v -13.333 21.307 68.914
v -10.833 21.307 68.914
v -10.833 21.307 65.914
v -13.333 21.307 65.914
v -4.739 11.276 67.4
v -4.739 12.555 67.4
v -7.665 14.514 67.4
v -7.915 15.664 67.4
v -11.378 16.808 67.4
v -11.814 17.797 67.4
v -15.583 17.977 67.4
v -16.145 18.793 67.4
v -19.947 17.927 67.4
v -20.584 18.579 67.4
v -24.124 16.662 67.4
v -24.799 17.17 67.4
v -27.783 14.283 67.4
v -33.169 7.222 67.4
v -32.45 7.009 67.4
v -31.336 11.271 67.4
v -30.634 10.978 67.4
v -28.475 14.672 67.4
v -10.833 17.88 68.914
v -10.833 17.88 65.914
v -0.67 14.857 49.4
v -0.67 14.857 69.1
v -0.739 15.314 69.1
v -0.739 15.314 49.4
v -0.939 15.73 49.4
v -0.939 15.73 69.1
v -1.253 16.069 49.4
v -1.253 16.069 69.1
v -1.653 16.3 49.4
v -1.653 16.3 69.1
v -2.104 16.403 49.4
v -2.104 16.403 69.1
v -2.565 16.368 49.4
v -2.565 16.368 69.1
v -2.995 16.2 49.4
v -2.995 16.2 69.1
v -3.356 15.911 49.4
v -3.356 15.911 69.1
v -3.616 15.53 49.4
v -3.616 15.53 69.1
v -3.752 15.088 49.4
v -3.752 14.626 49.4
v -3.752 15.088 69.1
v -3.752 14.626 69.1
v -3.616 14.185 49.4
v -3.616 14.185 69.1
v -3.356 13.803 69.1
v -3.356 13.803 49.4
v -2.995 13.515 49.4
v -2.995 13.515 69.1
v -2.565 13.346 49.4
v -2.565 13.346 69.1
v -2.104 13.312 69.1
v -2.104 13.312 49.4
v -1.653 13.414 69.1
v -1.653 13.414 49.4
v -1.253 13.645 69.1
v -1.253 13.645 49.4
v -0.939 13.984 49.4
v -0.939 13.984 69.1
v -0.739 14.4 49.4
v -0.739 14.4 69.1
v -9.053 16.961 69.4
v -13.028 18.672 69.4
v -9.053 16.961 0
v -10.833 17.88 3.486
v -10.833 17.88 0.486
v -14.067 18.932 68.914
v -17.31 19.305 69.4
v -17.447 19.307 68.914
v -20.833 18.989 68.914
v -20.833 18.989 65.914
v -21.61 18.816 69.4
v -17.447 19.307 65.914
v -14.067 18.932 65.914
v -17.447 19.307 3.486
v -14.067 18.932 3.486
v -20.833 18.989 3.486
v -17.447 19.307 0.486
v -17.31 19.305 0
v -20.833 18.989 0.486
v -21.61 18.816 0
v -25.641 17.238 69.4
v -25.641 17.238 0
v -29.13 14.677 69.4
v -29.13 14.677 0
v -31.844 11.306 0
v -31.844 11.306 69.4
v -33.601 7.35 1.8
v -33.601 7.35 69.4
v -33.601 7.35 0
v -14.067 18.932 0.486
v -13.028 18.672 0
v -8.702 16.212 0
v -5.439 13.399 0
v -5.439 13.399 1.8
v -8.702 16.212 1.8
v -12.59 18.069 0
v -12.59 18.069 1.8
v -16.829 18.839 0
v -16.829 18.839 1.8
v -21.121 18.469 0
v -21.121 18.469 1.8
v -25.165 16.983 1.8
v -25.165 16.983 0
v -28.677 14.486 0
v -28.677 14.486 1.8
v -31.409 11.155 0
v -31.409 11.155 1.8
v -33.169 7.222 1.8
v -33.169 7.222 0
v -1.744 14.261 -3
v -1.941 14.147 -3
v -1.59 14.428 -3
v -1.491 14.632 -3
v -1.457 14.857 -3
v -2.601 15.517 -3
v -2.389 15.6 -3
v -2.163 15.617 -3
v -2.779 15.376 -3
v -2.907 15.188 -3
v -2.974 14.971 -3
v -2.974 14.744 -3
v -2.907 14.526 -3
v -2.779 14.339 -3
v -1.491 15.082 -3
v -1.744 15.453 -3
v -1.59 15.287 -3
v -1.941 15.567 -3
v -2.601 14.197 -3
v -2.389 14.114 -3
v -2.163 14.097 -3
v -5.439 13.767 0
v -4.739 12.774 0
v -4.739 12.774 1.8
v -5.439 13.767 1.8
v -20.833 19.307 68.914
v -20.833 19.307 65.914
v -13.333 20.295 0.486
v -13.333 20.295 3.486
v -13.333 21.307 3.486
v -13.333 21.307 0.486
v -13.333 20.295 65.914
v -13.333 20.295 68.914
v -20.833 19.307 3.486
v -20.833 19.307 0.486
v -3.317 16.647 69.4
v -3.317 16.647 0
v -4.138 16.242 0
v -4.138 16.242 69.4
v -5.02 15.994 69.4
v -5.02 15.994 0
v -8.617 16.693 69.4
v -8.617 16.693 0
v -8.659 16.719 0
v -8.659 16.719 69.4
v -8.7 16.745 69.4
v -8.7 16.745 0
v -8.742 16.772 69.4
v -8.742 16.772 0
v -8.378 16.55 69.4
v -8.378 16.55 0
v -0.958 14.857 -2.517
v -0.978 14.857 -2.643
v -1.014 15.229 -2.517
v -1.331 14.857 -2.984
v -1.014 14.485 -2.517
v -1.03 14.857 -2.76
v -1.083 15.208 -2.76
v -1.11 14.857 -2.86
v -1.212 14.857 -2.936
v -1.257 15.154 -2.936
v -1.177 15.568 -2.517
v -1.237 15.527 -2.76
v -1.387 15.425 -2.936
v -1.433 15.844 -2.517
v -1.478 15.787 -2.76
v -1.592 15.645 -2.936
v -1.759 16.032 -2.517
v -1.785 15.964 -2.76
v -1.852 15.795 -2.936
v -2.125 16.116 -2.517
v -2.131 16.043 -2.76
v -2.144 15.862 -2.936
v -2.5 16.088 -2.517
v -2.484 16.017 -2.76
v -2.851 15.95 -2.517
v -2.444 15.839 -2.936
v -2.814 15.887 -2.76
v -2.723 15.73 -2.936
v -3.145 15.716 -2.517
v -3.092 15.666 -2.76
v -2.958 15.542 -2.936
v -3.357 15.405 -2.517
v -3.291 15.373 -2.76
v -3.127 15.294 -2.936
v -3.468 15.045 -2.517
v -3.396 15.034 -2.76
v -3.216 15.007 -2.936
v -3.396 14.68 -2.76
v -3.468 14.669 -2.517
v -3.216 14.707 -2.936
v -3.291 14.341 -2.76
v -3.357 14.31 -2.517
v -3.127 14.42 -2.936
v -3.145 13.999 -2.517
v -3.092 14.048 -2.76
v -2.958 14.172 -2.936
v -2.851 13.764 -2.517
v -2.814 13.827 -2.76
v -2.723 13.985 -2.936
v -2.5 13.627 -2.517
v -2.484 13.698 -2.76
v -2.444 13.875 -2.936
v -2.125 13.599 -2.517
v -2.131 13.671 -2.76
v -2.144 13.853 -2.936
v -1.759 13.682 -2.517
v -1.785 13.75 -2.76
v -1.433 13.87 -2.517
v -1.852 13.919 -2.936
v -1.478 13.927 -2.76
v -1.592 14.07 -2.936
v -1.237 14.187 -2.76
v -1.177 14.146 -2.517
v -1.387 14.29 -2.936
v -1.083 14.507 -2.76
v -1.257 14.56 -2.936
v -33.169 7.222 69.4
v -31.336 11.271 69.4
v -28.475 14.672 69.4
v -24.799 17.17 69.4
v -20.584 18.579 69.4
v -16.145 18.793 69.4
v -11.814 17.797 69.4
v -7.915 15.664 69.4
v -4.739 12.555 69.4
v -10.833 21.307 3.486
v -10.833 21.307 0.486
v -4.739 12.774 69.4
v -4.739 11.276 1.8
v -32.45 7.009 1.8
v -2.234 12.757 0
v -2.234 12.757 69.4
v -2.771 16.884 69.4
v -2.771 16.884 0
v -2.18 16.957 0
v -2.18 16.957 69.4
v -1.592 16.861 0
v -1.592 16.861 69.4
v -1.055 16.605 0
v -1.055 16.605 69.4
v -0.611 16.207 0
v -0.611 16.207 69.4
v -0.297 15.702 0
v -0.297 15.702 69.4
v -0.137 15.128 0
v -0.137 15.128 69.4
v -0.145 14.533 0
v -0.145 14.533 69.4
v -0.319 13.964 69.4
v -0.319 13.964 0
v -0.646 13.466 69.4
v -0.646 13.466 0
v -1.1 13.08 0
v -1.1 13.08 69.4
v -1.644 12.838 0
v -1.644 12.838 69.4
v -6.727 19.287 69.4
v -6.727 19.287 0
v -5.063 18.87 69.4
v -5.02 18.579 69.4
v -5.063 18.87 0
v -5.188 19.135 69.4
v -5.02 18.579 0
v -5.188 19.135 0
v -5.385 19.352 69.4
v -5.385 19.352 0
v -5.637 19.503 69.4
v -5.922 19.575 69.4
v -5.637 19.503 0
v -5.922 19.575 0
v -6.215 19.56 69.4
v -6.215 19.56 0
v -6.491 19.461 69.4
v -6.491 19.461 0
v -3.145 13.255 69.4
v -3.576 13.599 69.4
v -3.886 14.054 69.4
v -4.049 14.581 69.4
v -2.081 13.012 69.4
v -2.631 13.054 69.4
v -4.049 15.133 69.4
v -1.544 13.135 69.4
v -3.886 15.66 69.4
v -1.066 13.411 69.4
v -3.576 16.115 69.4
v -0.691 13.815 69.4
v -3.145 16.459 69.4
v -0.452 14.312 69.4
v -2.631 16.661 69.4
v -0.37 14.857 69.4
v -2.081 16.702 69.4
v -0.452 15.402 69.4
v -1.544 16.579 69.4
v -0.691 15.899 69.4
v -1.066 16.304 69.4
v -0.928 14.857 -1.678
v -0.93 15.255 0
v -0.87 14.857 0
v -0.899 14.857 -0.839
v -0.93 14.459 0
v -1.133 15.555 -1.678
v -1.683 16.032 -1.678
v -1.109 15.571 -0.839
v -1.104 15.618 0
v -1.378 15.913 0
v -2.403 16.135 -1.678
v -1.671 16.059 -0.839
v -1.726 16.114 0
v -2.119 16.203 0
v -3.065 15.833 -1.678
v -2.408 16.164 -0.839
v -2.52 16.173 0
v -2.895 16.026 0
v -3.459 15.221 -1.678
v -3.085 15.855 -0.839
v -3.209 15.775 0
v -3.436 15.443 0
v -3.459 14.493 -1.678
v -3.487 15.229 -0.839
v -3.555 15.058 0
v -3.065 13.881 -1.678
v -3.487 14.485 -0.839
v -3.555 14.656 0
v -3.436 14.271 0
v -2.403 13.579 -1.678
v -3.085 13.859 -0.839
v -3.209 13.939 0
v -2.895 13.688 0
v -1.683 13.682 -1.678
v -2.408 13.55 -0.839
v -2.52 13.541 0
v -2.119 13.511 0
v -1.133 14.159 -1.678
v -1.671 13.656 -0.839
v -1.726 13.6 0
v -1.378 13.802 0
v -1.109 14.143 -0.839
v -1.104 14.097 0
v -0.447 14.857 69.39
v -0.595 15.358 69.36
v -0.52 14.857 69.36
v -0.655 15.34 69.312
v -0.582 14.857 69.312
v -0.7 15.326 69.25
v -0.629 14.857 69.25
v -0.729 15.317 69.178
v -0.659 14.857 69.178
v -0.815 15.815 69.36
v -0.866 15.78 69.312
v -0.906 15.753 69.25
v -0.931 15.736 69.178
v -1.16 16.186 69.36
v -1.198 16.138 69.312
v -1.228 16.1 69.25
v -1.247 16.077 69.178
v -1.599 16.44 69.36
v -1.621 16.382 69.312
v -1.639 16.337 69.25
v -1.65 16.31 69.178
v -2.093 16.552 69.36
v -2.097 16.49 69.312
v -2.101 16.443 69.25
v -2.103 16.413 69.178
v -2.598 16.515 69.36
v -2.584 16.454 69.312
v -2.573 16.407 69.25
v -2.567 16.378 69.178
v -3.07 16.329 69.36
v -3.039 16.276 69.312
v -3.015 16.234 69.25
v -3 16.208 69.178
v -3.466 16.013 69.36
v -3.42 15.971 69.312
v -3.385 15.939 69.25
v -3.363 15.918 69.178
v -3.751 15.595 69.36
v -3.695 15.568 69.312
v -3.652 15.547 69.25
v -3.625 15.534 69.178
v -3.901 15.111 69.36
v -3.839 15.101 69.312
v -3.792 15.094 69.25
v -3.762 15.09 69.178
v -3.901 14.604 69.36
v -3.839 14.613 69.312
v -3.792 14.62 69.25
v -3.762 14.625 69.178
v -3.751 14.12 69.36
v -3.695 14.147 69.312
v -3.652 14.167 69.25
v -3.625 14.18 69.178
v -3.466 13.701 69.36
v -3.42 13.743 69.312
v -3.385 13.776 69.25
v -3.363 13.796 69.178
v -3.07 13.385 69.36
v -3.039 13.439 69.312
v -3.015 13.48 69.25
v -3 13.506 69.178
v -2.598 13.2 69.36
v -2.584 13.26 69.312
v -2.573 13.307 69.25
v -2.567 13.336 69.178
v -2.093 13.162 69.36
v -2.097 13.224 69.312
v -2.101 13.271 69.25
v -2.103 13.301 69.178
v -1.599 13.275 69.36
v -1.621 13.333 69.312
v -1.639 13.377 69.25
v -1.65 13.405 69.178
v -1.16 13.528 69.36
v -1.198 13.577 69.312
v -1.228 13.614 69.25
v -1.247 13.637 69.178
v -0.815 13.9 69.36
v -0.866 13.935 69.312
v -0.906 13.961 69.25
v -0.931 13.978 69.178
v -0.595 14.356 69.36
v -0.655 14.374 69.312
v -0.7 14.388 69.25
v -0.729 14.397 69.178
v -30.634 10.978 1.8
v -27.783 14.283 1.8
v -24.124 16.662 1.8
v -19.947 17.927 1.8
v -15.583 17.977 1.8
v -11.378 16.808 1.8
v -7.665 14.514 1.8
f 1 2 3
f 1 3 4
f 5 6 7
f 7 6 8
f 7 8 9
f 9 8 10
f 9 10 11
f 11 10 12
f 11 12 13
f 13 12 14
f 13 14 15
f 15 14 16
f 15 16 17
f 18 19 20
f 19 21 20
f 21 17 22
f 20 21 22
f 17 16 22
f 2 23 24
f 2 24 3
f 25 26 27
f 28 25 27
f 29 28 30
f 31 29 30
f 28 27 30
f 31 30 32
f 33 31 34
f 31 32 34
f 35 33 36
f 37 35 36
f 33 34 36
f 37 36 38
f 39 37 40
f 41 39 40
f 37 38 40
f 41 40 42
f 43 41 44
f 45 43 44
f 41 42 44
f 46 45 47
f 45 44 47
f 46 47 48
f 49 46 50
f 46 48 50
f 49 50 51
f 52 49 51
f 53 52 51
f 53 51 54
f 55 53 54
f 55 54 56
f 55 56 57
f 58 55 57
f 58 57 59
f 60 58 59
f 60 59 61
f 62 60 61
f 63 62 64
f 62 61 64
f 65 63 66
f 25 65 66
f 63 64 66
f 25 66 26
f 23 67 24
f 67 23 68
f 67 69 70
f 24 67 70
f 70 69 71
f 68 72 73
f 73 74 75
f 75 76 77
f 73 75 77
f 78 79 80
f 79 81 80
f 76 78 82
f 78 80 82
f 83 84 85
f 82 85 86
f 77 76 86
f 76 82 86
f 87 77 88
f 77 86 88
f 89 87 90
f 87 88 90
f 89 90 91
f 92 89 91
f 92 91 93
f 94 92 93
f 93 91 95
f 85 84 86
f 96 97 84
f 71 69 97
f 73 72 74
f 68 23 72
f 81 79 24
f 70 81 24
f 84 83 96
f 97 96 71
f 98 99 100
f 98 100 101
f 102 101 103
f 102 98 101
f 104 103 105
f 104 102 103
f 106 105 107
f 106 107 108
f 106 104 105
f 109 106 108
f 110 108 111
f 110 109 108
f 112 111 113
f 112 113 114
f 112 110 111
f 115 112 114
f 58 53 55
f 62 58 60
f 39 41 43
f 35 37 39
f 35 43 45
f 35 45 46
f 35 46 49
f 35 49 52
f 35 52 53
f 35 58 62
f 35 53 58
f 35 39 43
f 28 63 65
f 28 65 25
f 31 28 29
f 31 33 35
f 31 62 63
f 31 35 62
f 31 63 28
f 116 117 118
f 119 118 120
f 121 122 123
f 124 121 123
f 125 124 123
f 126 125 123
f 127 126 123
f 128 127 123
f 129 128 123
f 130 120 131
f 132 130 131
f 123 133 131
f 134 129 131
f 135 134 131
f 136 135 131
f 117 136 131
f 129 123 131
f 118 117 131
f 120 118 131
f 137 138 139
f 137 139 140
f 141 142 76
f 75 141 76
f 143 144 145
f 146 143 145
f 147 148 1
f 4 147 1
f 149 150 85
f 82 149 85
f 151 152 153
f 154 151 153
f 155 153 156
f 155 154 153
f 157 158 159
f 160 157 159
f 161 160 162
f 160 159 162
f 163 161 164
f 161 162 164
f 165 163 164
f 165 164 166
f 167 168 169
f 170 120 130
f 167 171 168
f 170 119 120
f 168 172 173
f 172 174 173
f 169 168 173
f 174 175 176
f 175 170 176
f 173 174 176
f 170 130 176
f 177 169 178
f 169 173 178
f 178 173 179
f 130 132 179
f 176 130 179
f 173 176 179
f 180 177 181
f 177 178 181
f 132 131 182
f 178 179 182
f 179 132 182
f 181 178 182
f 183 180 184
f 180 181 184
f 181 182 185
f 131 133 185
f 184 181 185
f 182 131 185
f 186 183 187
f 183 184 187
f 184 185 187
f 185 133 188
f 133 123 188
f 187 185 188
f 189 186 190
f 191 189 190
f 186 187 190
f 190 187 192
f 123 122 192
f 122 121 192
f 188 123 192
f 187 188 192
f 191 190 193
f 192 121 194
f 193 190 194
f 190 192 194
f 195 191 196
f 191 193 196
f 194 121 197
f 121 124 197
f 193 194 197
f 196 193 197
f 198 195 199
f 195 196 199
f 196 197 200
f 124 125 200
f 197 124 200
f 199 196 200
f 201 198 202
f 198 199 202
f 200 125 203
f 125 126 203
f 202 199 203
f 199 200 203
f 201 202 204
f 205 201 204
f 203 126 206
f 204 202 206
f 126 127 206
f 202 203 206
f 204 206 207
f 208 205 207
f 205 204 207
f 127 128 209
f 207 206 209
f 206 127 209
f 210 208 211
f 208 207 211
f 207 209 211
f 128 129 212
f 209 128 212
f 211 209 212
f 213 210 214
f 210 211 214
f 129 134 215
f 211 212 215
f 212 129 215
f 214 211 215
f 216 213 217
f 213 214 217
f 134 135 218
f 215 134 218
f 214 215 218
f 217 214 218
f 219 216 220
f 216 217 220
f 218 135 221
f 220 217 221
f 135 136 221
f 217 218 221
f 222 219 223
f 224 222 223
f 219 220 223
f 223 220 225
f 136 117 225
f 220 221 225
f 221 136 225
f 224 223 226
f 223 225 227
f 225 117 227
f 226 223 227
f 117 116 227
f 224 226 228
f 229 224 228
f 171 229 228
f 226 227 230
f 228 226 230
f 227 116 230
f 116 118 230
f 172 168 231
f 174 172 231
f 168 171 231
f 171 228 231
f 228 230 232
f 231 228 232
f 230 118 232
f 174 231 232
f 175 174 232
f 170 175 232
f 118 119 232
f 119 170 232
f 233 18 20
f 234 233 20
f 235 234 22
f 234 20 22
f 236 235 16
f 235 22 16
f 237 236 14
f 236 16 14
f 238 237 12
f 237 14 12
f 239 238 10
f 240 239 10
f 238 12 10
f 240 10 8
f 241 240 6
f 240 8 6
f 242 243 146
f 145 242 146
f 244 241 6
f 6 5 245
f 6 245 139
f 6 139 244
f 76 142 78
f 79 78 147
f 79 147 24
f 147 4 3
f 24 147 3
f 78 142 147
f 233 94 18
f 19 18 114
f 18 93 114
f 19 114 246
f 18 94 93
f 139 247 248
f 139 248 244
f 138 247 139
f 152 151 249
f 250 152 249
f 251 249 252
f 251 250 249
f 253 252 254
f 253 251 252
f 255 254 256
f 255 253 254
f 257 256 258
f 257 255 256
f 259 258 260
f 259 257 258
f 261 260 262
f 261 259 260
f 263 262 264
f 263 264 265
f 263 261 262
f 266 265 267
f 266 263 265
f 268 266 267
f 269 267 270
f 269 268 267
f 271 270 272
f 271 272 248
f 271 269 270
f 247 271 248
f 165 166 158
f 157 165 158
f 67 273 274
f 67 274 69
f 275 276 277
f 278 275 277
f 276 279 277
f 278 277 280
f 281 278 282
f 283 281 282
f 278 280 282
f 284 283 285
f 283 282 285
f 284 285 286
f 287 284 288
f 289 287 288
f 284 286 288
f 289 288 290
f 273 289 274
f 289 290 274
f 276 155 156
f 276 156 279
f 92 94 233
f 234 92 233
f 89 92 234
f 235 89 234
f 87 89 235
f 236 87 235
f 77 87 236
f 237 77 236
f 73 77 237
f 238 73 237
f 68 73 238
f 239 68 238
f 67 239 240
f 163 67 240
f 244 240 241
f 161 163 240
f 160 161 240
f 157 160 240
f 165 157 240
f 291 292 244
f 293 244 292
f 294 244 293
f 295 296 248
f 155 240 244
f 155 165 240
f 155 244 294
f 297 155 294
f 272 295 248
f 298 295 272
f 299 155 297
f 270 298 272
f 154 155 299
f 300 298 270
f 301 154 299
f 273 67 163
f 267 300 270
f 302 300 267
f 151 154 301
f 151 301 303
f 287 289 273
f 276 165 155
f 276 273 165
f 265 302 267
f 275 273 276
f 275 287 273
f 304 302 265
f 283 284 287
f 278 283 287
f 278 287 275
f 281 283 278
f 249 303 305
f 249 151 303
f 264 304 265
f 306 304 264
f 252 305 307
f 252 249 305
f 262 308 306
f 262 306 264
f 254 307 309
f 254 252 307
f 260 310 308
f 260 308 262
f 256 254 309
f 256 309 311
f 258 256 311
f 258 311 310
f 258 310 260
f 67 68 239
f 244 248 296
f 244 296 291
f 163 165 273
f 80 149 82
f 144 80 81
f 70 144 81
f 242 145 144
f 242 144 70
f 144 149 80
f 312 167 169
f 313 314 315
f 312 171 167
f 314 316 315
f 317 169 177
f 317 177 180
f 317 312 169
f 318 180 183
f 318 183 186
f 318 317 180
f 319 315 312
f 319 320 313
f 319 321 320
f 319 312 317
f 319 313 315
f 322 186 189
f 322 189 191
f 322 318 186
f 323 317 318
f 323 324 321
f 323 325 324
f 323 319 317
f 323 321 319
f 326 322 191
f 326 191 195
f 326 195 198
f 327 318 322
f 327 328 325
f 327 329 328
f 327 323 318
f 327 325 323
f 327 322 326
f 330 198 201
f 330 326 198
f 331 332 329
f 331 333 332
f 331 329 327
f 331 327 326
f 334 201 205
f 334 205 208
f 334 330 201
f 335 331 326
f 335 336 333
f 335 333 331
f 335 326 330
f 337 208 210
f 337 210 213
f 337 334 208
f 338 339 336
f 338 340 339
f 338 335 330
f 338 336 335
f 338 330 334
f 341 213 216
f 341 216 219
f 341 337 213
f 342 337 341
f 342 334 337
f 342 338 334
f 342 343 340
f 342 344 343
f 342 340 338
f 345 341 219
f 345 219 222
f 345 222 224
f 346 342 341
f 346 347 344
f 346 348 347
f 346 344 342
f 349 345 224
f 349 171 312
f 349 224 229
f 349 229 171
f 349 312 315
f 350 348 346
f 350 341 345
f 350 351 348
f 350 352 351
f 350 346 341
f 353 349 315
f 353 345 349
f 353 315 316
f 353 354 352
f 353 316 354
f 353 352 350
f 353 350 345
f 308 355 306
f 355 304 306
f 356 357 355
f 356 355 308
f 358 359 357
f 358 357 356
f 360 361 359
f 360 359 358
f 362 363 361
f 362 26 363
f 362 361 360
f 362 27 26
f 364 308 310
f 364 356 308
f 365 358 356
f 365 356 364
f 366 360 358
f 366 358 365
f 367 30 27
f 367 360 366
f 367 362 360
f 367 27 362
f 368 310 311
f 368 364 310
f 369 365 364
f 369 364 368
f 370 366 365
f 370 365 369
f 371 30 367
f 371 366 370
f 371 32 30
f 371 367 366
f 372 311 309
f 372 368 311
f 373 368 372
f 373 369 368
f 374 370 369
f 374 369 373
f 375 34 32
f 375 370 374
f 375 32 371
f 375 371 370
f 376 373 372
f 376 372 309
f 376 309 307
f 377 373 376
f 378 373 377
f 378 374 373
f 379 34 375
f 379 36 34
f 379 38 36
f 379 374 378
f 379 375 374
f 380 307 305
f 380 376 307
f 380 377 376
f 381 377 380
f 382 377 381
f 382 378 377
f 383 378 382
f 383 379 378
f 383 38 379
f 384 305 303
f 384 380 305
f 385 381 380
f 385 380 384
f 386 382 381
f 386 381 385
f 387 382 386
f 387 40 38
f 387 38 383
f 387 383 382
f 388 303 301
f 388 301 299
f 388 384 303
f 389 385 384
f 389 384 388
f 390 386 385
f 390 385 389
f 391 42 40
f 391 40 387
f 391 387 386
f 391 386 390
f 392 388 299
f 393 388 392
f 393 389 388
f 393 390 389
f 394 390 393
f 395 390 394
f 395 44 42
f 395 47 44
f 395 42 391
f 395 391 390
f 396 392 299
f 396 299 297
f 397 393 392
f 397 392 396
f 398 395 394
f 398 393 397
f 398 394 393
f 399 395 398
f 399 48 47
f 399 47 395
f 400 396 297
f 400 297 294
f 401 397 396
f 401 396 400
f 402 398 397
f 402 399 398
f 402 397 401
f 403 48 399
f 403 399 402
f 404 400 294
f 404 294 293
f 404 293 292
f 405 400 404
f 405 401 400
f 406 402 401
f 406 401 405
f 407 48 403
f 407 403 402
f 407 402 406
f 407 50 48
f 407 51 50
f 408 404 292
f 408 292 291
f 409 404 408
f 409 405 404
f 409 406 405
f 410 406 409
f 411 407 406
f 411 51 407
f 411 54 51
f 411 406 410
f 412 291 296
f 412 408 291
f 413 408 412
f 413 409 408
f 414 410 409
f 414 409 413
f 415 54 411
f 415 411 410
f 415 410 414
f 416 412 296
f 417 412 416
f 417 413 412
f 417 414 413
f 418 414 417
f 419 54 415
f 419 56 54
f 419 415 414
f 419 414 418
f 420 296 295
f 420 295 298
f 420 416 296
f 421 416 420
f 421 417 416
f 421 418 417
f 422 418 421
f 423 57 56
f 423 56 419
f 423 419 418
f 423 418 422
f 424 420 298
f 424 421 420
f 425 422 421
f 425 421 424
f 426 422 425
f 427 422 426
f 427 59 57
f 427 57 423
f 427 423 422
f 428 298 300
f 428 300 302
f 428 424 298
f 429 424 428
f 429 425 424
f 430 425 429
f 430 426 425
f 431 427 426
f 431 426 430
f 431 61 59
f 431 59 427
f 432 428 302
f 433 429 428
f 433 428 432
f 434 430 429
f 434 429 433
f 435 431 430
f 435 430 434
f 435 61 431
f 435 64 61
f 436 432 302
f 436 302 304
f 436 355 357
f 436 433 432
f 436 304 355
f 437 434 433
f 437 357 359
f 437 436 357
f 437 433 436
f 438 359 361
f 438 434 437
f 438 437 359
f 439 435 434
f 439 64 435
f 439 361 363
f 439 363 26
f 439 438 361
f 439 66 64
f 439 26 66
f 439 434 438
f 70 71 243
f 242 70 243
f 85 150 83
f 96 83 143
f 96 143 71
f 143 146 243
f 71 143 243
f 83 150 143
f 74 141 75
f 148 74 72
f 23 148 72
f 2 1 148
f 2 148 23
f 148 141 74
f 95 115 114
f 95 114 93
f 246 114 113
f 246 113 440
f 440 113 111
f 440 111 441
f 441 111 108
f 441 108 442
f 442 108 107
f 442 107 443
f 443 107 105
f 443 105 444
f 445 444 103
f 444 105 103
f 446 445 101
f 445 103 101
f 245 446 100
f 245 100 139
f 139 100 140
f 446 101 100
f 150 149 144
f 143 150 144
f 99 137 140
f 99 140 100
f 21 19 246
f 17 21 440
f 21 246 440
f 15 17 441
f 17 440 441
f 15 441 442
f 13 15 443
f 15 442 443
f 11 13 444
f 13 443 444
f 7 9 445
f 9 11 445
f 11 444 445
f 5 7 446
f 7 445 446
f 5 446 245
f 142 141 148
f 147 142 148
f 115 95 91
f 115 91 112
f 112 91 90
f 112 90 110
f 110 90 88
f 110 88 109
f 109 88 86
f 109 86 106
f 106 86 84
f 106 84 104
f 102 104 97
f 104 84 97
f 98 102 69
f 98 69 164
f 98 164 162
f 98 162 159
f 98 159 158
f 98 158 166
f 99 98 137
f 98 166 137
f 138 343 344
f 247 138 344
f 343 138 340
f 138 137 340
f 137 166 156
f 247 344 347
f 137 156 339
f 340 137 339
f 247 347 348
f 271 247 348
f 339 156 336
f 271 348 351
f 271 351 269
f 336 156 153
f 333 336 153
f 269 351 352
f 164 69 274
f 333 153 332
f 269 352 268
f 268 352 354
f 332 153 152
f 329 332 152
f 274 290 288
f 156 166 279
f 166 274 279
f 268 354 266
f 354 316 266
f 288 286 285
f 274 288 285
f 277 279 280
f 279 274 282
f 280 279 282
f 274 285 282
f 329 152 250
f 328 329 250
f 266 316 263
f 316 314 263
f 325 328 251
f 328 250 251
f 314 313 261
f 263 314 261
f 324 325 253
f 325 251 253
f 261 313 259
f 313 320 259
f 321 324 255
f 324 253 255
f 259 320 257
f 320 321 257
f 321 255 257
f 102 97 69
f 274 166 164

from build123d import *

# Parameters (mm, degrees)
BOSS_EXTRU_1_DEPTH      = 1.8
BOSS_EXTRU_2_DEPTH      = 67.6
ESQUISSE3_R             = 1.35
BOSS_EXTRU_3_DEPTH      = 3
BOSS_EXTRU_3_DRAFT      = -2
BOSS_EXTRU_4_DEPTH      = 69.4
CONG_1_R                = 5
ESQUISSE5_R             = 1.55
ENL_V_MAT_EXTRU_1_DEPTH = 20
BOSS_EXTRU_5_START      = 0.486262707
BOSS_EXTRU_5_DEPTH      = 3
ENL_V_START             = -2
ENL_V_MAT_EXTRU_2_DEPTH = 2
ENL_V_MAT_EXTRU_3_DEPTH = 83.186412318
BOSS_EXTRU_6_DEPTH      = 69.4
CONG_2_R                = 1
CONG_3_R                = 0.3
CONG_4_R                = 0.5


# Read off the part's stored shape, not the designer's step: Boss.-Extru.5
with BuildPart() as part:
    # Esquisse1 → Boss.-Extru.1 (new body)
    with BuildSketch(Plane.XY):
        with BuildLine():
            Line((-33.169498422, 7.22242532), (-33.600967303, 7.350232225))
            ThreePointArc((-33.600967303, 7.350232225), (-21.461995756, 18.851787613), (-5.439284285, 14.065022141))
            Line((-5.439284285, 14.065022141), (-5.439284285, 13.398595658))
            ThreePointArc((-5.439284285, 13.398595658), (-21.121374045, 18.468530159), (-33.169498422, 7.22242532))
        make_face()
    extrude(amount=BOSS_EXTRU_1_DEPTH)

    # Esquisse2 → Boss.-Extru.2 (add)
    with BuildSketch(Plane.XY.offset(1.8)):
        with BuildLine():
            Line((-33.600967303, 7.350232225), (-32.450383621, 7.009413812))
            ThreePointArc((-32.450383621, 7.009413812), (-19.947199013, 17.926685666), (-4.739284285, 11.275687265))
            Line((-4.739284285, 11.275687265), (-4.739284285, 13.274091553))
            ThreePointArc((-4.739284285, 13.274091553), (-5.083029835, 13.675092245), (-5.439284285, 14.065022141))
            ThreePointArc((-5.439284285, 14.065022141), (-21.461995756, 18.851787613), (-33.600967303, 7.350232225))
        make_face()
    extrude(amount=BOSS_EXTRU_2_DEPTH)



with BuildPart() as body_2:
    # Esquisse3 → Boss.-Extru.3 (with draft: the straight prism first)
    with BuildSketch(Plane.XY):
        with Locations((-2.219642143, 14.857175969)):
            Circle(ESQUISSE3_R)
    extrude(amount=-BOSS_EXTRU_3_DEPTH)
    # Boss.-Extru.3: the draft: its side faces are tilted about the plane it starts from
    boss_extru_3_sides = [body_2.faces().sort_by_distance(p)[0] for p in [
        (-3.569642143, 14.857175969, -1.5),
    ]]
    draft(boss_extru_3_sides, Plane.XY, BOSS_EXTRU_3_DRAFT)


with BuildPart() as part_1:
    add(part.part)

    add(body_2.part)  # Boss.-Extru.4 merges body 2
    # Esquisse4 → Boss.-Extru.4 (add)
    with BuildSketch(Plane.XY):
        with BuildLine():
            Line((-2.233779809, 12.757223558), (-4.739284285, 12.774091553))
            Line((-4.739284285, 12.774091553), (-6.149439768, 14.774091553))
            Line((-6.149439768, 14.774091553), (-3.378858565, 16.608237729))
            ThreePointArc((-3.378858565, 16.608237729), (-0.206741875, 15.455701249), (-2.233779809, 12.757223558))
        make_face()
    extrude(amount=BOSS_EXTRU_4_DEPTH)

    # Congé1
    cong_1_edges = [part_1.edges().sort_by_distance(p)[0] for p in [
        (-6.149439768, 14.774091553, 34.7),
    ]]
    fillet(cong_1_edges, radius=CONG_1_R)

    # Esquisse5 → Enlèv. mat.-Extru.1 (cut)
    with BuildSketch(Plane.XY.offset(69.4)):
        with Locations((-2.219642143, 14.857175969)):
            Circle(ESQUISSE5_R)
    extrude(amount=-ENL_V_MAT_EXTRU_1_DEPTH, mode=Mode.SUBTRACT)

    # Boss.-Extru.5 outline → Boss.-Extru.5 (add)
    with BuildSketch(Plane.XY.offset(BOSS_EXTRU_5_START)):
        with BuildLine():
            Line((-10.832608102, 17.879553752), (-10.832608102, 21.307175969))
            Line((-10.832608102, 21.307175969), (-20.832608102, 21.307175969))
            Line((-20.832608102, 21.307175969), (-20.832608102, 18.989084153))
            ThreePointArc((-20.832608102, 18.989084153), (-15.747062959, 19.205322101), (-10.832608102, 17.879553752))
        make_face()
    boss_extru_5 = extrude(amount=BOSS_EXTRU_5_DEPTH)

    # Symétrie1: Boss.-Extru.5 across plane
    add(boss_extru_5.mirror(Plane.XY.offset(34.7)))

    # Esquisse7 → Enlèv. mat.-Extru.2 (cut)
    with BuildSketch(Plane.XY.offset(69.4).offset(ENL_V_START)):
        with BuildLine():
            Line((-32.450383621, 7.009413812), (-33.169498422, 7.22242532))
            ThreePointArc((-33.169498422, 7.22242532), (-20.584304116, 18.578673161), (-4.739284285, 12.554818307))
            Line((-4.739284285, 12.554818307), (-4.739284285, 11.275687265))
            ThreePointArc((-4.739284285, 11.275687265), (-19.947199013, 17.926685666), (-32.450383621, 7.009413812))
        make_face()
    extrude(amount=ENL_V_MAT_EXTRU_2_DEPTH, mode=Mode.SUBTRACT)

    # Esquisse9 → Enlèv. mat.-Extru.3 (cut, through all)
    with BuildSketch(Plane.XY.offset(68.913737293)):
        Polygon((-20.832608102, 19.307175969), (-13.332608102, 20.294569701), (-13.332608102, 21.307175969), (-20.832608102, 21.307175969), align=None)
    extrude(amount=-ENL_V_MAT_EXTRU_3_DEPTH, mode=Mode.SUBTRACT)

    # Esquisse10 → Boss.-Extru.6 (add)
    with BuildSketch(Plane.XY.offset(69.4)):
        Polygon((-5.019642143, 15.993667324), (-5.019642143, 20.993667324), (-9.052568259, 16.960741208), (-4.646335714, 14.274994024), align=None)
    extrude(amount=-BOSS_EXTRU_6_DEPTH)

    # Congé2
    cong_2_edges = [part_1.edges().sort_by_distance(p)[0] for p in [
        (-5.019642143, 20.993667324, 34.7),
    ]]
    fillet(cong_2_edges, radius=CONG_2_R)

    # Congé3
    cong_3_edges = [part_1.edges().sort_by_distance(p)[0] for p in [
        (-3.769642143, 14.857175969, 69.4),
    ]]
    fillet(cong_3_edges, radius=CONG_3_R)

    # Congé4
    cong_4_edges = [part_1.edges().sort_by_distance(p)[0] for p in [
        (-3.464879834, 14.857175969, -3),
    ]]
    fillet(cong_4_edges, radius=CONG_4_R)


solid = part_1.part
